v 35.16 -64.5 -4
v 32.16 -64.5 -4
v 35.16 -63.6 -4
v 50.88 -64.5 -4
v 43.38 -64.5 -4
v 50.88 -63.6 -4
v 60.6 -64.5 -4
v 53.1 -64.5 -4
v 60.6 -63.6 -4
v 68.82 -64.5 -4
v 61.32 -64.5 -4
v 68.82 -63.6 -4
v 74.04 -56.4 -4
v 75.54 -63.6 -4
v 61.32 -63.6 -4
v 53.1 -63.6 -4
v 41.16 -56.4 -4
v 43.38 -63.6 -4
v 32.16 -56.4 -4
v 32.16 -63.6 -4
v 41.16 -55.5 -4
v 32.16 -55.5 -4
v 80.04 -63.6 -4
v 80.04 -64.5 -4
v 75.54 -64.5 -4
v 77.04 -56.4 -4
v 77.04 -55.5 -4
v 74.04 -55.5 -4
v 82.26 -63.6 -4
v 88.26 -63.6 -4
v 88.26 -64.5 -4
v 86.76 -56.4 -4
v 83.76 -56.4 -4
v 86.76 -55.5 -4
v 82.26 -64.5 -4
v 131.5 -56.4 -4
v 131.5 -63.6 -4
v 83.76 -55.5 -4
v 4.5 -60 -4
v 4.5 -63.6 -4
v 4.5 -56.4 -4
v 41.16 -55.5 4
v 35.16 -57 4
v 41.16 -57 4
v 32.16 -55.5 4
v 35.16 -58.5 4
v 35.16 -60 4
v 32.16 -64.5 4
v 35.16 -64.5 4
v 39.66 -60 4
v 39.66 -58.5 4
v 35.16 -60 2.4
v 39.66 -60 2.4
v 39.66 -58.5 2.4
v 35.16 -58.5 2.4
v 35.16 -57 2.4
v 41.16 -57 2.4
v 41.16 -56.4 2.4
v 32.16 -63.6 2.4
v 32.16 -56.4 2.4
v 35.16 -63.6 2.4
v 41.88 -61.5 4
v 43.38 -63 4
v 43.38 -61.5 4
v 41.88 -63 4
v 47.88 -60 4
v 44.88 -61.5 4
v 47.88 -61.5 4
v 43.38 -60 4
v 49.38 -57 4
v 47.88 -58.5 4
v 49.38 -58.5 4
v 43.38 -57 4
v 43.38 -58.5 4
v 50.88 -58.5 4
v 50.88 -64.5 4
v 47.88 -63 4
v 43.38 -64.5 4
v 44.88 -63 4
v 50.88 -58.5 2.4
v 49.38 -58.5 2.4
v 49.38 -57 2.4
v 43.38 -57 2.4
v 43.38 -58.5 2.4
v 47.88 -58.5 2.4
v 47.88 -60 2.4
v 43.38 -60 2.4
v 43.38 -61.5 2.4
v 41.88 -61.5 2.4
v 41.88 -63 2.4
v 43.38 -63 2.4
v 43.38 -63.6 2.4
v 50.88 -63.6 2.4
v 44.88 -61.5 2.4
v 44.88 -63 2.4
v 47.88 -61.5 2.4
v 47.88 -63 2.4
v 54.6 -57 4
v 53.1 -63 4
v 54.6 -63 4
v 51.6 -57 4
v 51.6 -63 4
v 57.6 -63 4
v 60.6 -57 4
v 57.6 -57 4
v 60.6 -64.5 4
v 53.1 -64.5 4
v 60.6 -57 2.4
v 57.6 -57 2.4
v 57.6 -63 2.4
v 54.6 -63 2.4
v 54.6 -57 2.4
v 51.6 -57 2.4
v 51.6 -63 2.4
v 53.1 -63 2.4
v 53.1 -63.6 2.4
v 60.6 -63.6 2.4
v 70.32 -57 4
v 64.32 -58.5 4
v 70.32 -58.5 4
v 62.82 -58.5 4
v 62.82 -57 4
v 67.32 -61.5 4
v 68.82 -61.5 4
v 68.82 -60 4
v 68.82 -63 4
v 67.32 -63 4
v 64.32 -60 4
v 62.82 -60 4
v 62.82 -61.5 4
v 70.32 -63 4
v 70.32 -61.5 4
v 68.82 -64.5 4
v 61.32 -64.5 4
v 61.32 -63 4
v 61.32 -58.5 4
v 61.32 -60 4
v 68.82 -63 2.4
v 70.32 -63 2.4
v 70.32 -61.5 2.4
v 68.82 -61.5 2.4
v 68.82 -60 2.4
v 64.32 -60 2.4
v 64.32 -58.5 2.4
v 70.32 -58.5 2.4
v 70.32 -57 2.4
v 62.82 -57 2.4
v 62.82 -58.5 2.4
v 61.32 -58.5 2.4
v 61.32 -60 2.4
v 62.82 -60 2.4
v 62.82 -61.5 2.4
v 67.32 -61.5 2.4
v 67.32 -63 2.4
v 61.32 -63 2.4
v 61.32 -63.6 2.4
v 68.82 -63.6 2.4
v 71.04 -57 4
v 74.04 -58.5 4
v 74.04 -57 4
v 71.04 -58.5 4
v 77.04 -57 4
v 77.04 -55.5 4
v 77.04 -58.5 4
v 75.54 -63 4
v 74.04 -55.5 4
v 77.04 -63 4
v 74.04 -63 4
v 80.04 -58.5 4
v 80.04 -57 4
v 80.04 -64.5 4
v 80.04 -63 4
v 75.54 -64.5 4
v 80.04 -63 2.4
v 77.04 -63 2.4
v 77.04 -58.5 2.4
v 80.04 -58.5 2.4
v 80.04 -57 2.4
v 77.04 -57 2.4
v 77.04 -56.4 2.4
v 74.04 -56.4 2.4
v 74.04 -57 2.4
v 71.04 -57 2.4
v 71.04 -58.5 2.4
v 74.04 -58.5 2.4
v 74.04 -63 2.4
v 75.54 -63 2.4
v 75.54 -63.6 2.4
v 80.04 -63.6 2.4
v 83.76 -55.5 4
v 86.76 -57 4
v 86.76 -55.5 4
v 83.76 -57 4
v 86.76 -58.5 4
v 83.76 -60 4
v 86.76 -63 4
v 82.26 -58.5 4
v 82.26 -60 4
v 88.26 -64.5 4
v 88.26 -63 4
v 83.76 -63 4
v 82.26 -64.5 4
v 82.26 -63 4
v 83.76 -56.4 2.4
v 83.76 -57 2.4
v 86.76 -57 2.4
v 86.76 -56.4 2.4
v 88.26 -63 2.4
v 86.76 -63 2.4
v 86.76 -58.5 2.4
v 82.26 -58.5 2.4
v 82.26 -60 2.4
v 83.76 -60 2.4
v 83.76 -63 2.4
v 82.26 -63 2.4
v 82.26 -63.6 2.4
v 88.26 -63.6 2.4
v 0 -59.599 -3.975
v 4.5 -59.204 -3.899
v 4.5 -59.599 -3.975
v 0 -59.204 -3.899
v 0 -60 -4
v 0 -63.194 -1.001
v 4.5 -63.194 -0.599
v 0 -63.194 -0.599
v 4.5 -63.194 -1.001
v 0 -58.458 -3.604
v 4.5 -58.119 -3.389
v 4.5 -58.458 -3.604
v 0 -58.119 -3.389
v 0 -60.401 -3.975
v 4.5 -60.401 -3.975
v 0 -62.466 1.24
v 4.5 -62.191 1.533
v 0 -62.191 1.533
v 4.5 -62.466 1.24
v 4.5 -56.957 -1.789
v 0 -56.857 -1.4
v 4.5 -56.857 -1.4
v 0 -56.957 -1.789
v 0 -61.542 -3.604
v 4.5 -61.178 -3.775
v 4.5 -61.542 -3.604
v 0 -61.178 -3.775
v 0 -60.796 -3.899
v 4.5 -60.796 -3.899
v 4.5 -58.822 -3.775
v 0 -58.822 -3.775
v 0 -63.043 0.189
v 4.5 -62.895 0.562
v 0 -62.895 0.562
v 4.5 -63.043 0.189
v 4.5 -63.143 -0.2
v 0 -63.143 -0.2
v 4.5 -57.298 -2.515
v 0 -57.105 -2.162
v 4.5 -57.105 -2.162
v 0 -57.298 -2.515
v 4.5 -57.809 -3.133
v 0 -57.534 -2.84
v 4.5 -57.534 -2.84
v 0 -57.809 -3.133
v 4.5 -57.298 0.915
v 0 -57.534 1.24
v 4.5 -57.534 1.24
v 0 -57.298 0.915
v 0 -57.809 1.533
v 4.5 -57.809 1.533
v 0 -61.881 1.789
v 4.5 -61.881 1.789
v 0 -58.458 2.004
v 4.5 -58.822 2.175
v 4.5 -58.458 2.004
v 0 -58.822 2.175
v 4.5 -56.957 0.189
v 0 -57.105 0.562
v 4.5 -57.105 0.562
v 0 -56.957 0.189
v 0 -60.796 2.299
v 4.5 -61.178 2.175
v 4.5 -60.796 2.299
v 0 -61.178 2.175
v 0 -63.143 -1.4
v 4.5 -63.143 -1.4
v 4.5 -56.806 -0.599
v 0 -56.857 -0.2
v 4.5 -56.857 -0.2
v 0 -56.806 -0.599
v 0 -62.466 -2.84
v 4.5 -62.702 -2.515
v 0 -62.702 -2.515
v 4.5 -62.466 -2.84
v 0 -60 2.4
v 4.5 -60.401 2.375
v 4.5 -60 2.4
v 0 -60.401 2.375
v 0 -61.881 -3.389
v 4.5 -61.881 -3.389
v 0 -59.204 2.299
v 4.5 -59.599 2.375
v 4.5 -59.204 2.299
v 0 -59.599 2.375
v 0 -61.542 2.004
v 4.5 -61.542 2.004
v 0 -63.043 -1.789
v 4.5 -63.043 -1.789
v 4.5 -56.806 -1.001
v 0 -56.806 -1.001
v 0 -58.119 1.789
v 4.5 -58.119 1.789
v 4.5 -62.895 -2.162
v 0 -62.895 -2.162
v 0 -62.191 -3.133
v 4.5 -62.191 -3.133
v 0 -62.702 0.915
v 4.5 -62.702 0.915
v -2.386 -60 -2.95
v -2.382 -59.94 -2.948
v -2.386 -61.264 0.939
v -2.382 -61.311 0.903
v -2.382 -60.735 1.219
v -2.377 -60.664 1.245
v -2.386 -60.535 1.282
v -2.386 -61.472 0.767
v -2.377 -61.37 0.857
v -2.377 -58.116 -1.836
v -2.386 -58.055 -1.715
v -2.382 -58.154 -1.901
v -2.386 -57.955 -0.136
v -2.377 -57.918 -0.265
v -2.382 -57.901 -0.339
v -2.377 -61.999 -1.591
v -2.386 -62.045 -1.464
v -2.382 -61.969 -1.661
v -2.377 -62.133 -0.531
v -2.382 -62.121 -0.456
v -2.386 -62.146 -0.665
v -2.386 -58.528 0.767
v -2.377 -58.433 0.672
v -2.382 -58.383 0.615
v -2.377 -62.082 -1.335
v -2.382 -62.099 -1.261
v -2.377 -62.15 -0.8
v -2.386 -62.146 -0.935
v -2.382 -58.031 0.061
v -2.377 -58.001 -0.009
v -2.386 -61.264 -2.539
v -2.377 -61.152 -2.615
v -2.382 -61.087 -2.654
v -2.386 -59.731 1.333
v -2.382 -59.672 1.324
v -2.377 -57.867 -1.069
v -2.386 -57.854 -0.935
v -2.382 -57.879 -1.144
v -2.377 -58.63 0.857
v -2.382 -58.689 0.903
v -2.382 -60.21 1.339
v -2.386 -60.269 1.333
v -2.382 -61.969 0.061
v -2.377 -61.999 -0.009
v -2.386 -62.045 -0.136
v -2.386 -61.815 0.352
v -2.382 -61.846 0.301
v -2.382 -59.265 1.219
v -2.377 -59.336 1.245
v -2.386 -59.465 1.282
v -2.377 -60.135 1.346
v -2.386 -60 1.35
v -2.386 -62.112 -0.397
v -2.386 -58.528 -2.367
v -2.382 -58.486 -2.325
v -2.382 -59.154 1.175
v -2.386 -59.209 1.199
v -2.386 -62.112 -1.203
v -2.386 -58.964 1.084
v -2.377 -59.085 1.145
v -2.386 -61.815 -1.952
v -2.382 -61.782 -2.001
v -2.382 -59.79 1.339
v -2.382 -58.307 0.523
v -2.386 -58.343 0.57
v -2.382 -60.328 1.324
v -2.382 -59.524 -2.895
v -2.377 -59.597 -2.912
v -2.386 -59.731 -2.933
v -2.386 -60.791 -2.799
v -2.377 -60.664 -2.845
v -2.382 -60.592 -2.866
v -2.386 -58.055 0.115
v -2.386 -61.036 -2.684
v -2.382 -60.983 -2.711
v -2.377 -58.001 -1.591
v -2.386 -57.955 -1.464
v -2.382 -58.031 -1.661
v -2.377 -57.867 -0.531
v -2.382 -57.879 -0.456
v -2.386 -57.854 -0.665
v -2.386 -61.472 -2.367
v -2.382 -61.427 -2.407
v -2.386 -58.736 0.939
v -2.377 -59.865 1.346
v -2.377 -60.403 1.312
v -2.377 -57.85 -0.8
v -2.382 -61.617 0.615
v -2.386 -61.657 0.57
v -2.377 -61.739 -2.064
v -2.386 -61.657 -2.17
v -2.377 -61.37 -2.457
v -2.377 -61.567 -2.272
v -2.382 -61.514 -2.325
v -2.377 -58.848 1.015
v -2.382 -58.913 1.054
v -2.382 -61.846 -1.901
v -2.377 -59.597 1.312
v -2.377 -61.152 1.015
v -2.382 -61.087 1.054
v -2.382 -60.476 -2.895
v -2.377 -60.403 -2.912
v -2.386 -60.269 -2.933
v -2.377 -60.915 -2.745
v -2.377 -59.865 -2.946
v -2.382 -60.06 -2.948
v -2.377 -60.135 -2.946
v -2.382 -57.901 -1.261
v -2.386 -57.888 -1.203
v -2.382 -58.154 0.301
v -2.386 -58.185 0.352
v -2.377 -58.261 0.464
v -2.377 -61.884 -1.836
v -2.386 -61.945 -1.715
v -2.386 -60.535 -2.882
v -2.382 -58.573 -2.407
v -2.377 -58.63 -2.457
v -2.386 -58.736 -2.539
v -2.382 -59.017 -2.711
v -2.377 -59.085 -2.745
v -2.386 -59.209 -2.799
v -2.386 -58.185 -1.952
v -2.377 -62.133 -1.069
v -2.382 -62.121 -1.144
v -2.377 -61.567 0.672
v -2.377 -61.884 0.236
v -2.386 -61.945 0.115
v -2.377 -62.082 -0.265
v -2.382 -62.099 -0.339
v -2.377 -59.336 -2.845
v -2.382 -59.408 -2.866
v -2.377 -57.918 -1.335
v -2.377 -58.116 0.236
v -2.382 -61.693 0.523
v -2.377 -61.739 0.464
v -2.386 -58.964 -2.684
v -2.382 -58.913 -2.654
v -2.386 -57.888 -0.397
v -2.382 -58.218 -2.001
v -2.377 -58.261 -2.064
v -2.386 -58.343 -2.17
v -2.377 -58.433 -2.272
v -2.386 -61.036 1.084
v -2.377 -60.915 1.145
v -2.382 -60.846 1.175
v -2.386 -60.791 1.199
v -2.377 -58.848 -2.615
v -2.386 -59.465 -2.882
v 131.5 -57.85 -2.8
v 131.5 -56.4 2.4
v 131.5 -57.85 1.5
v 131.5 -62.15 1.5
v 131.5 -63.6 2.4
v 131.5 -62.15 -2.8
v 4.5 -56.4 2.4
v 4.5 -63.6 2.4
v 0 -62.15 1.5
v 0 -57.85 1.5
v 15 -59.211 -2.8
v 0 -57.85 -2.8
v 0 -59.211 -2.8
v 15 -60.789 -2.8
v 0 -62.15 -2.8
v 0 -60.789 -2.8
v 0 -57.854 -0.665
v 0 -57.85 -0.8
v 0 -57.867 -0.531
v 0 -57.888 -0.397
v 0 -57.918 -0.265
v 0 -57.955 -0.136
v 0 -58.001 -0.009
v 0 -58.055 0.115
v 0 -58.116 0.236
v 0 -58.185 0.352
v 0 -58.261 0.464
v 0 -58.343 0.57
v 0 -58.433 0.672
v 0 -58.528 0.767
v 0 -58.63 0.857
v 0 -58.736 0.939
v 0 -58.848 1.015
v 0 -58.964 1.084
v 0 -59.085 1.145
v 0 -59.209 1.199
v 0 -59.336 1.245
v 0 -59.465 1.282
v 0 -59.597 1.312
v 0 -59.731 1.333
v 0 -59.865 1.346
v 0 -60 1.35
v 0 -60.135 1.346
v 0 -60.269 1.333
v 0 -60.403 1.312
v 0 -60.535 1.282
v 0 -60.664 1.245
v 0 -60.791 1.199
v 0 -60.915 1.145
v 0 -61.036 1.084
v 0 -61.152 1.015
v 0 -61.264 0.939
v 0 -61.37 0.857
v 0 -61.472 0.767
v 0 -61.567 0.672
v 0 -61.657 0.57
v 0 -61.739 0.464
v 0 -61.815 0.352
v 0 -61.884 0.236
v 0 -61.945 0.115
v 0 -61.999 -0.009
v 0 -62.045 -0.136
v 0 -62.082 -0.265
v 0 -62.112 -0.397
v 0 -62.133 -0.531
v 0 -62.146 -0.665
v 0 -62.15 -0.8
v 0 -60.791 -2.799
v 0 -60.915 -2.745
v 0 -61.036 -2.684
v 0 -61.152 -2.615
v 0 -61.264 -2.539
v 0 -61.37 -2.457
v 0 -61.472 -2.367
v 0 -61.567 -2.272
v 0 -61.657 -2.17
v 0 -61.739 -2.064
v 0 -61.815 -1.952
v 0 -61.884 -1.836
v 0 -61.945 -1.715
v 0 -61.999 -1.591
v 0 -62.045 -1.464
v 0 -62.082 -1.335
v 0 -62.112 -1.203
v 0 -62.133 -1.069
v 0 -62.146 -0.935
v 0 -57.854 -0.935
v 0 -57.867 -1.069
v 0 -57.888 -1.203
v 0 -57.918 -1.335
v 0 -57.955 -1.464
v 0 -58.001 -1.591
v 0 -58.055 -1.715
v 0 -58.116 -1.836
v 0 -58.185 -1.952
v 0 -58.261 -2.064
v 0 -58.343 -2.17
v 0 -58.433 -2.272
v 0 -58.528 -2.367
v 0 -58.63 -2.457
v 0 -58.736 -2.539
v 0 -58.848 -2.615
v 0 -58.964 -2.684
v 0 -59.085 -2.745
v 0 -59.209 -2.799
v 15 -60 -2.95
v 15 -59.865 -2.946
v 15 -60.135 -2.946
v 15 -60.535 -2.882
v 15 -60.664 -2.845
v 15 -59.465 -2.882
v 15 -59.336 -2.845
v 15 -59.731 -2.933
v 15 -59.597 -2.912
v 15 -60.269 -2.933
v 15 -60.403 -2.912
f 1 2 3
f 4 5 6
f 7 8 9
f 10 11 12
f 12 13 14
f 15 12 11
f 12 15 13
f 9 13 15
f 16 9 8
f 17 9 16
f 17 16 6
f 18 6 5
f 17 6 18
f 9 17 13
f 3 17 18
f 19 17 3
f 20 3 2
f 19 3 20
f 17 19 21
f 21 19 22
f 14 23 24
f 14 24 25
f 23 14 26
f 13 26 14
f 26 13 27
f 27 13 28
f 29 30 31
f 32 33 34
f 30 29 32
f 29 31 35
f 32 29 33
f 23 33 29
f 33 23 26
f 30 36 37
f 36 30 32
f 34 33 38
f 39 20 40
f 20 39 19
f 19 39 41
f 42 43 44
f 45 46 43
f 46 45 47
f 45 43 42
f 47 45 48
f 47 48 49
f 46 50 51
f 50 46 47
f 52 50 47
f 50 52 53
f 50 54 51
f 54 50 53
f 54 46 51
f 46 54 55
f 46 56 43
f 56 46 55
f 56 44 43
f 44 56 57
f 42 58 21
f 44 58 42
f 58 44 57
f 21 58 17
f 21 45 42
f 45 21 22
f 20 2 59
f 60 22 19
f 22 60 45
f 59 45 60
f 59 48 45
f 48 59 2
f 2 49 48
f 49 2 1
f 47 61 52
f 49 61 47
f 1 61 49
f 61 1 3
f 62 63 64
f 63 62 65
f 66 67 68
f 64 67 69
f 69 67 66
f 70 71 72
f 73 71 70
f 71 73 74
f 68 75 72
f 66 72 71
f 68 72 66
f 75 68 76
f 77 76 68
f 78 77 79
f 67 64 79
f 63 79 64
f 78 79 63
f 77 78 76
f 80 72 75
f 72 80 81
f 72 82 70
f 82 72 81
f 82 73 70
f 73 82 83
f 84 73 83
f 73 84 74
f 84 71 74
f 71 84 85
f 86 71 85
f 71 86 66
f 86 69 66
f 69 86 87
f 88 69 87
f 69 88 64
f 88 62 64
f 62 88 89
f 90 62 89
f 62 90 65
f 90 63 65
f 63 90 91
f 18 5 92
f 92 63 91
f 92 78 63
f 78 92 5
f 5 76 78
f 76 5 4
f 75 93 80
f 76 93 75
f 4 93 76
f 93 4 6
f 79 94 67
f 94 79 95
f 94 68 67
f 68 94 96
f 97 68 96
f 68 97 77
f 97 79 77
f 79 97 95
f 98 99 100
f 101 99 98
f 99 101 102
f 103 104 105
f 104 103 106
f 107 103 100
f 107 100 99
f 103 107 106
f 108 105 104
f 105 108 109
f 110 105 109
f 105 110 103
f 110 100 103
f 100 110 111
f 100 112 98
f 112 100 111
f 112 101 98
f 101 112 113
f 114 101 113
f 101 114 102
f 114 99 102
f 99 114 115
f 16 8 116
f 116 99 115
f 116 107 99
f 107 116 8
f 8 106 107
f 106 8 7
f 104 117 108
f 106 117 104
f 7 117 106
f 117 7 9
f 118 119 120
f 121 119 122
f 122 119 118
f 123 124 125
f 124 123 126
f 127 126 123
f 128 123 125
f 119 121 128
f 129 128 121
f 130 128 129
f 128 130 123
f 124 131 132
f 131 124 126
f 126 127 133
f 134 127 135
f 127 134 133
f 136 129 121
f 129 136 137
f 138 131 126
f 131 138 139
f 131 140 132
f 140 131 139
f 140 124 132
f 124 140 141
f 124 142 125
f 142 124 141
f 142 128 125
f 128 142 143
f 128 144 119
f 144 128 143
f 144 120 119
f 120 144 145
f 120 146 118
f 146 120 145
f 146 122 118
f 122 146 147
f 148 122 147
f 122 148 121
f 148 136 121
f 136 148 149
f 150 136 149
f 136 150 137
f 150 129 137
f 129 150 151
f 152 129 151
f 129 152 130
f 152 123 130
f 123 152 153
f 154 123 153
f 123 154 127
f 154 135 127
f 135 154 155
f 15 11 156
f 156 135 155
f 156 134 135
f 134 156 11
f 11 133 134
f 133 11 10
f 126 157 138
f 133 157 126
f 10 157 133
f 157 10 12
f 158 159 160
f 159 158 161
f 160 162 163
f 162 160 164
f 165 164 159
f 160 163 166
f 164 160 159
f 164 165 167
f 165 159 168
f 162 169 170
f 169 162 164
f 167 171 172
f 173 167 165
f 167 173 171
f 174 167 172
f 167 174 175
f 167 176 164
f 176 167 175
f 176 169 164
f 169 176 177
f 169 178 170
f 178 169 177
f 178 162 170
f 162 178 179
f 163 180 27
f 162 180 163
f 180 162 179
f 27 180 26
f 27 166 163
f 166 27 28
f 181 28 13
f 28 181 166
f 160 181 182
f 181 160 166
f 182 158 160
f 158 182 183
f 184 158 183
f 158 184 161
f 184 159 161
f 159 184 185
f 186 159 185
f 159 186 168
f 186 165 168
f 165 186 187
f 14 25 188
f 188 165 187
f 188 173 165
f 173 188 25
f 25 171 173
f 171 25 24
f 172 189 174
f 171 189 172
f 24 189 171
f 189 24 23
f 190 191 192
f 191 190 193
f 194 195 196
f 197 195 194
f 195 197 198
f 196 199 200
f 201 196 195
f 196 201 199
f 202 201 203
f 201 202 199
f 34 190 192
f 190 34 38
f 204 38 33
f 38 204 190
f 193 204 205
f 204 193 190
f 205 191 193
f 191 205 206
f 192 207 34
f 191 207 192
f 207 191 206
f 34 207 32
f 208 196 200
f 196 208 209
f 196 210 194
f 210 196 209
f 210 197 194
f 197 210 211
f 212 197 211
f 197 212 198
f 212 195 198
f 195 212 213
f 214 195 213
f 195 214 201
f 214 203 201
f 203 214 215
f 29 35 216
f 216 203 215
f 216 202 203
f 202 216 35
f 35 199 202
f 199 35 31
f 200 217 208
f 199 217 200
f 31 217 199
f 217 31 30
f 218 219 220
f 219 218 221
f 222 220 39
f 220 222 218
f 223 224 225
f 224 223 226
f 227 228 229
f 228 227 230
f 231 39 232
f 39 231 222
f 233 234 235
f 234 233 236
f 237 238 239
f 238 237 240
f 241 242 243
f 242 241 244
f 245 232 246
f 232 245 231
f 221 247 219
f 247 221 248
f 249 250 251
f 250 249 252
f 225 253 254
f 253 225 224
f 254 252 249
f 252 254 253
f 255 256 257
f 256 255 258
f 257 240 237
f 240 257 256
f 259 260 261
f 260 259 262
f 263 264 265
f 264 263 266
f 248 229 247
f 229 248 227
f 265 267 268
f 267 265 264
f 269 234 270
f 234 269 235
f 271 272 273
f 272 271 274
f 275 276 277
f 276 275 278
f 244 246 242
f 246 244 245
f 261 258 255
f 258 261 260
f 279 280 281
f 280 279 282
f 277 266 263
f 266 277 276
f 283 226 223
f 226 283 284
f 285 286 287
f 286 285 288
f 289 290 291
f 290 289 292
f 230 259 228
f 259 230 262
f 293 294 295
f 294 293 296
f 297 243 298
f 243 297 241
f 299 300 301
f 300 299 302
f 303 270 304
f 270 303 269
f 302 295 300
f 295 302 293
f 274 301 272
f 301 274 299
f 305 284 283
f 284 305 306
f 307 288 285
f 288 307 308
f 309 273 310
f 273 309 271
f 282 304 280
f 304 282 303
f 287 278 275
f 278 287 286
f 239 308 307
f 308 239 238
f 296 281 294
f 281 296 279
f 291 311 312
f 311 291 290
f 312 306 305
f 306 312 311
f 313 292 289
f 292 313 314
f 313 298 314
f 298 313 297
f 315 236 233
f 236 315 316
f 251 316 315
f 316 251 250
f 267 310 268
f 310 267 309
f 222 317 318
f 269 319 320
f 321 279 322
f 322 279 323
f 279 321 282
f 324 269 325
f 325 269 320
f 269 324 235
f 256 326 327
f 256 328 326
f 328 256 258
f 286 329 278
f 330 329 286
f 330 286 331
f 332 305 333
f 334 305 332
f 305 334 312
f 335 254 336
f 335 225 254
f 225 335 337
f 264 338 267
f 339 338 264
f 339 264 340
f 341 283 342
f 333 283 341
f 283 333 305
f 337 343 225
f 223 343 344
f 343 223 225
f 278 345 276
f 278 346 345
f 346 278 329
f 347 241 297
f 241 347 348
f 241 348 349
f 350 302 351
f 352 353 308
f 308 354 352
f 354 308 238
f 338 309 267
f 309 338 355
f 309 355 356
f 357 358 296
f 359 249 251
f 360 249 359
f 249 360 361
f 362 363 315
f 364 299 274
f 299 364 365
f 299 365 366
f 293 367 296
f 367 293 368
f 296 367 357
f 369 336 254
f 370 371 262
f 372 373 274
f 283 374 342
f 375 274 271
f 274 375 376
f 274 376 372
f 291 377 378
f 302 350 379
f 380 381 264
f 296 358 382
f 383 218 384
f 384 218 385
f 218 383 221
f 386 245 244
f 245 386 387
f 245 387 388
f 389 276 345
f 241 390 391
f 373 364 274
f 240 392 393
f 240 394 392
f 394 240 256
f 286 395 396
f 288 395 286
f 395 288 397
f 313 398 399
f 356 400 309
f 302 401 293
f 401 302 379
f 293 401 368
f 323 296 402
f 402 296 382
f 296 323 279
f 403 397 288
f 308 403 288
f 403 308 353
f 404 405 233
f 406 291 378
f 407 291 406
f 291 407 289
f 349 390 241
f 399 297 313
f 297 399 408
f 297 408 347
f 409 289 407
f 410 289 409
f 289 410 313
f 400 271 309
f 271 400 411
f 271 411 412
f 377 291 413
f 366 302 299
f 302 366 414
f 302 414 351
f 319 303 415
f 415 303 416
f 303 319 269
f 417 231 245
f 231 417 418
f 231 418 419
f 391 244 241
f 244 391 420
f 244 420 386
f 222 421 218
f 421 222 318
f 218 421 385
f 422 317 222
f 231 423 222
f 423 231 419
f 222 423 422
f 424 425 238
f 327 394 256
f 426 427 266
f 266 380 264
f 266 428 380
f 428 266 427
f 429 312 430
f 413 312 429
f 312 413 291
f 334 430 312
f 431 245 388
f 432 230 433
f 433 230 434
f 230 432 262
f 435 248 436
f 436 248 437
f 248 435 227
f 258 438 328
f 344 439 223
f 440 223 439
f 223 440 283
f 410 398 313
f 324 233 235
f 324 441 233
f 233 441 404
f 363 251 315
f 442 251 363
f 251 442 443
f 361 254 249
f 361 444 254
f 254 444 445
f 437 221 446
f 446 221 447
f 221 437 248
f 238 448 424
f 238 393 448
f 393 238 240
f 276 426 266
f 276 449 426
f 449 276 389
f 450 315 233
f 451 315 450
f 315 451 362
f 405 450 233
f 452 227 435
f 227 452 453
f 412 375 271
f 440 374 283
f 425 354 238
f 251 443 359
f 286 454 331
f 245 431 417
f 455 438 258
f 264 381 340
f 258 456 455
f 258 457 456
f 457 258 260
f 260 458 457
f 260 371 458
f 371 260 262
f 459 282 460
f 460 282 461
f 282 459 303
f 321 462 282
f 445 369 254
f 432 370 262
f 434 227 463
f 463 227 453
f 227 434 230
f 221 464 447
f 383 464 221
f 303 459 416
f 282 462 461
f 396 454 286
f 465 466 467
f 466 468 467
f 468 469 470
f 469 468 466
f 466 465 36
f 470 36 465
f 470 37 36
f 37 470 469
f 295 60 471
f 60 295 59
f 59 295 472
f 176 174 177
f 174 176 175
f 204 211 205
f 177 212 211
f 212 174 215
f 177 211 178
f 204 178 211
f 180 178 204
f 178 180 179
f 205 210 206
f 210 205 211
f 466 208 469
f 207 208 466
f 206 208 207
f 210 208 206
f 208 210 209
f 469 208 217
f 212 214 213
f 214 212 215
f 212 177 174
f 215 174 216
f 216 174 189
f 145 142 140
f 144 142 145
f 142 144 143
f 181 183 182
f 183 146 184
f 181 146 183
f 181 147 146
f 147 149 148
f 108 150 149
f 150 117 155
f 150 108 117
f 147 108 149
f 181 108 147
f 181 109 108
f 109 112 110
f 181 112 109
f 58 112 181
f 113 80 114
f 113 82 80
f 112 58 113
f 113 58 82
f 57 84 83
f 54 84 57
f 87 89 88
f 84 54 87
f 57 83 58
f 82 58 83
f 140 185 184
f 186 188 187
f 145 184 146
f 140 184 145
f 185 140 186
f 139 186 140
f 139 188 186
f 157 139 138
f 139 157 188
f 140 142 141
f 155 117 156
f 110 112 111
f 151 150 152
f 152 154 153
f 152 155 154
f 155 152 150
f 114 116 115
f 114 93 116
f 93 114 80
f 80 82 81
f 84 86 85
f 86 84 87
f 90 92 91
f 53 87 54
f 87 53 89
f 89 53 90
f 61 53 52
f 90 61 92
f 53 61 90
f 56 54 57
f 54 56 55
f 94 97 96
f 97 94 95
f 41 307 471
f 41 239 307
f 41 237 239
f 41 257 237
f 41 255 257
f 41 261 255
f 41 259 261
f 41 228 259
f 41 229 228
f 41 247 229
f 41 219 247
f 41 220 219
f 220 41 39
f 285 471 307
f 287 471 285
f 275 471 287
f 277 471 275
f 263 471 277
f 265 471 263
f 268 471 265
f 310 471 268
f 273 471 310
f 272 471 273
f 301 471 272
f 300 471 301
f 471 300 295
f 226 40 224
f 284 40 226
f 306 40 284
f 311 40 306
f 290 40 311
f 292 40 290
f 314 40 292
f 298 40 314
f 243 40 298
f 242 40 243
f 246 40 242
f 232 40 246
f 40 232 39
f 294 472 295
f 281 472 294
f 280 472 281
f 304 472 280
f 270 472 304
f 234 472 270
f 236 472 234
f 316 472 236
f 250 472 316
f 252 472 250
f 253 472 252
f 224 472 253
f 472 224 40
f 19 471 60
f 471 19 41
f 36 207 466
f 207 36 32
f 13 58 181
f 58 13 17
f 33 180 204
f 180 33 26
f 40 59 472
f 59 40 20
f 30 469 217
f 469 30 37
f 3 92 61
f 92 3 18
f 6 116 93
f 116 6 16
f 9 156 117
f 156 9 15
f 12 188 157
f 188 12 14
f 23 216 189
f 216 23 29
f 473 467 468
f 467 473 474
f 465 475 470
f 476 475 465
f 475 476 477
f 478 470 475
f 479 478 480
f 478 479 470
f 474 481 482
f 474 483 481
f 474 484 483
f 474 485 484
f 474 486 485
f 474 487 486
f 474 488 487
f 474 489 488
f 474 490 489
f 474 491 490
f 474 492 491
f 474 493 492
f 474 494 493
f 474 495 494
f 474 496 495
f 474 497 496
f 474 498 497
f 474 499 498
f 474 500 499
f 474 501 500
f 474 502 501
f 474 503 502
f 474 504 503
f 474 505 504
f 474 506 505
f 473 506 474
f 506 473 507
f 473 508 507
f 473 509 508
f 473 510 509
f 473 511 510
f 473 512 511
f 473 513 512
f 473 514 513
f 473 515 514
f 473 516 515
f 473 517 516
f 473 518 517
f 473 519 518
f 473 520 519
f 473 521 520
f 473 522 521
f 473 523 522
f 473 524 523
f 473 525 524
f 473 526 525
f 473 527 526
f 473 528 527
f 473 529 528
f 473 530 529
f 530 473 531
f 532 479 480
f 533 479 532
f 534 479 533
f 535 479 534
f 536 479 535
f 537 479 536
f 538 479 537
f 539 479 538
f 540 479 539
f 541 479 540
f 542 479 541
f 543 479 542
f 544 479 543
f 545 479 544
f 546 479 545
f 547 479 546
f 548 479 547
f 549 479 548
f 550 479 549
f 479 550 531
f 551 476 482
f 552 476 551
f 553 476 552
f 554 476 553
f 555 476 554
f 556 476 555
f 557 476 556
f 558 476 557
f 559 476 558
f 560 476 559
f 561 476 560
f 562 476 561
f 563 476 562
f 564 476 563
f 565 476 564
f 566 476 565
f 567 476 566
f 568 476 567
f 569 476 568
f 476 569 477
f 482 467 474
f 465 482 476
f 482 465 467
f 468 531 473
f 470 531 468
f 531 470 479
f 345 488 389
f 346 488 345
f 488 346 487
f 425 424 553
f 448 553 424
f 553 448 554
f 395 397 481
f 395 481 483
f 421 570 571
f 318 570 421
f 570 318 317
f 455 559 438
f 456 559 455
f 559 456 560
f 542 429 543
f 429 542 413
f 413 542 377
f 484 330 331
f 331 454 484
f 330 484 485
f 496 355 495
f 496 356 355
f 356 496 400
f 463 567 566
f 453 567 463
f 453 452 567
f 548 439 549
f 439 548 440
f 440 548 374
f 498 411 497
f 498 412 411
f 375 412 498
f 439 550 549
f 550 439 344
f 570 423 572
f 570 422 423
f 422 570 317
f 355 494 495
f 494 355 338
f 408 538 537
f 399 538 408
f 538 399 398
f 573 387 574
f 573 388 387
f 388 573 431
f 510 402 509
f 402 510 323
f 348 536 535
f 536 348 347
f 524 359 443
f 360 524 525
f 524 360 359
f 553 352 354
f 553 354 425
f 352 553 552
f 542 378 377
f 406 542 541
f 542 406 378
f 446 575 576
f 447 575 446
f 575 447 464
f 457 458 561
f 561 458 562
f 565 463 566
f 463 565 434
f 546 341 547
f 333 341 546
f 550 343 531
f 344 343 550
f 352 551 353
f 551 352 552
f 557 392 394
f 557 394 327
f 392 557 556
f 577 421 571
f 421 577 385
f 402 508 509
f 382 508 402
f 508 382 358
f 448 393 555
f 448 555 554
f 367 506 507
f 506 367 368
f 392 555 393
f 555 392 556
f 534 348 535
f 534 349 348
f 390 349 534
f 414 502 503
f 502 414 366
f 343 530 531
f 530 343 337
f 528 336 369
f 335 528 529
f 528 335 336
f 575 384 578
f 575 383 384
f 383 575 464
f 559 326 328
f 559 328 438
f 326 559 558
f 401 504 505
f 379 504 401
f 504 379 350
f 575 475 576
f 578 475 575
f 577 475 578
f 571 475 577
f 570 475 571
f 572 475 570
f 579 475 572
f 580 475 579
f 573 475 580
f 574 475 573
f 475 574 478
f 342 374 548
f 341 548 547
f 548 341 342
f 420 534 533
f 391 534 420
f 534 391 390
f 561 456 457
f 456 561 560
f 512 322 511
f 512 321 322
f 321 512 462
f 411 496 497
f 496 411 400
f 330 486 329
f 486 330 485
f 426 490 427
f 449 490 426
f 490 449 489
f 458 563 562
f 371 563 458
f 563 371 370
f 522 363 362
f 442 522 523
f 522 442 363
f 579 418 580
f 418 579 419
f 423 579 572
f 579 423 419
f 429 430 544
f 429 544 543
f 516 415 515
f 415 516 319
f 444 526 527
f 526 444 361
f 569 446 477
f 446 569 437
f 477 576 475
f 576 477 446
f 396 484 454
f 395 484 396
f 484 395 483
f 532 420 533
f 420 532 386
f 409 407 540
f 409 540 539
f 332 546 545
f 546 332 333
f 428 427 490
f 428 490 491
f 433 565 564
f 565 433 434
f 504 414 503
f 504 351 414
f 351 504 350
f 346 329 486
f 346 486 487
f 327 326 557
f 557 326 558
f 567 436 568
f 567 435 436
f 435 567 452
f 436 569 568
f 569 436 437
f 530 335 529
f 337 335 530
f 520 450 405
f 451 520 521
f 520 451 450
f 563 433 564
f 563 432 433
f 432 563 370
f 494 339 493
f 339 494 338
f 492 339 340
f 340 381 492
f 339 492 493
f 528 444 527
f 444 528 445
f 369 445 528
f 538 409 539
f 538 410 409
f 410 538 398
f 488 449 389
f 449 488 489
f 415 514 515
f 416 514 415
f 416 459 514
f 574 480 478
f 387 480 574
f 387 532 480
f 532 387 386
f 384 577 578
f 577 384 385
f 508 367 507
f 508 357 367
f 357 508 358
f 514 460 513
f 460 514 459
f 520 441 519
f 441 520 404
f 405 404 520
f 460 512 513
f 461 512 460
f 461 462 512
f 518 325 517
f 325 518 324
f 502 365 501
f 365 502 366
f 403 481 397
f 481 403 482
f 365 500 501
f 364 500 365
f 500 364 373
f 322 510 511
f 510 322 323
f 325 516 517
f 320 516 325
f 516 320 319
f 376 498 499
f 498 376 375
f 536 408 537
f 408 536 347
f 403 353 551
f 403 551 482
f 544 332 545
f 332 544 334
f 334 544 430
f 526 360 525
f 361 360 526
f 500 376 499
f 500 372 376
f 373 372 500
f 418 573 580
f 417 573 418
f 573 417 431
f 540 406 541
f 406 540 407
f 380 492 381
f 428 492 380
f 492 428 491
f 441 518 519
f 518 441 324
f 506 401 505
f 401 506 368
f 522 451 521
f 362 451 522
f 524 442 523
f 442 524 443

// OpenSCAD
use <MCAD/fonts.scad>

// Word to display on the pen
//word = "Gonzalo";

// Scale multipler for font size
//font_scale = 1.5	;

// Character Spacing (for some reason this value is buggy using the customizer)
//font_spacing = 0.81; 

// The diameter of end hole
pen_inner_diameter = 4.3 *1;
pen_inner_radius = pen_inner_diameter / 2;

// length of the entire pen
//pen_length = 80; //

// Overal thickness of the pen
pen_thickness = 8*1;


/////////////////////////////////////////
//////////////////////////////////



module penword(word, font_scale, font_spacing, pen_length )
{

thisFont=8bit_polyfont();
x_shift=thisFont[0][0] * font_spacing;
y_shift=thisFont[0][1];

	theseIndicies=search(word,thisFont[2],1,1);
	wordlength = (len(theseIndicies))* x_shift;
	
	difference() {

		union() {

// Create the Text //
			scale([font_scale,font_scale,1]){
			for( j=[0:(len(theseIndicies)-1)] ) 
				translate([ j*x_shift + 1, -y_shift/2 ,-pen_thickness/2]) 
				{
					linear_extrude(height=pen_thickness) polygon(points=thisFont[2][theseIndicies[j]][6][0],paths=thisFont[2][theseIndicies[j]][6][1]);
				}
			}
			
// Main body
			translate([1*font_scale+3	,-y_shift*.45,-pen_thickness/2]) cube([pen_length - 3,y_shift * 0.9,pen_thickness * 0.8]);

// Pen Tip
			rotate(a=[0,90,0]) 
				{
					translate([pen_thickness*0.1,0,0	])	cylinder(h = 5, r = pen_thickness*.4, $fn=50);
					translate([pen_thickness*0.1,0,-5	])	cylinder(h = 5, r1 = 1, r2 = pen_thickness*.4, $fn=50);
				}			
		}
// Cut outs
			translate([0,-pen_inner_diameter/2,-pen_thickness/2+pen_thickness*.15]) cube([pen_length + 20,pen_inner_diameter,pen_inner_diameter]);
			rotate(a=[0,90,0])translate([pen_thickness*.1,0,-15])	cylinder(h = 30, r = pen_inner_radius, $fn=100);
	}
}

/*translate([0, 60,0]) penword(" Belen", 1.5, 0.81, 80);
translate([0, 40,0]) penword(" Marina", 1.5, 0.81, 80);
translate([0, 20,0]) penword(" Natalia", 1.5, 0.81, 80);
translate([0, 0,0]) penword(" Lucas", 1.5, 0.81, 80);
translate([0, -20,0]) penword(" Pablo", 1.5, 0.81, 80);
translate([0, -40,0]) penword(" Ines", 1.5, 0.81, 80);*/
translate([0, -60,0]) penword("   Fausti", 1.5, 0.81, 130);
